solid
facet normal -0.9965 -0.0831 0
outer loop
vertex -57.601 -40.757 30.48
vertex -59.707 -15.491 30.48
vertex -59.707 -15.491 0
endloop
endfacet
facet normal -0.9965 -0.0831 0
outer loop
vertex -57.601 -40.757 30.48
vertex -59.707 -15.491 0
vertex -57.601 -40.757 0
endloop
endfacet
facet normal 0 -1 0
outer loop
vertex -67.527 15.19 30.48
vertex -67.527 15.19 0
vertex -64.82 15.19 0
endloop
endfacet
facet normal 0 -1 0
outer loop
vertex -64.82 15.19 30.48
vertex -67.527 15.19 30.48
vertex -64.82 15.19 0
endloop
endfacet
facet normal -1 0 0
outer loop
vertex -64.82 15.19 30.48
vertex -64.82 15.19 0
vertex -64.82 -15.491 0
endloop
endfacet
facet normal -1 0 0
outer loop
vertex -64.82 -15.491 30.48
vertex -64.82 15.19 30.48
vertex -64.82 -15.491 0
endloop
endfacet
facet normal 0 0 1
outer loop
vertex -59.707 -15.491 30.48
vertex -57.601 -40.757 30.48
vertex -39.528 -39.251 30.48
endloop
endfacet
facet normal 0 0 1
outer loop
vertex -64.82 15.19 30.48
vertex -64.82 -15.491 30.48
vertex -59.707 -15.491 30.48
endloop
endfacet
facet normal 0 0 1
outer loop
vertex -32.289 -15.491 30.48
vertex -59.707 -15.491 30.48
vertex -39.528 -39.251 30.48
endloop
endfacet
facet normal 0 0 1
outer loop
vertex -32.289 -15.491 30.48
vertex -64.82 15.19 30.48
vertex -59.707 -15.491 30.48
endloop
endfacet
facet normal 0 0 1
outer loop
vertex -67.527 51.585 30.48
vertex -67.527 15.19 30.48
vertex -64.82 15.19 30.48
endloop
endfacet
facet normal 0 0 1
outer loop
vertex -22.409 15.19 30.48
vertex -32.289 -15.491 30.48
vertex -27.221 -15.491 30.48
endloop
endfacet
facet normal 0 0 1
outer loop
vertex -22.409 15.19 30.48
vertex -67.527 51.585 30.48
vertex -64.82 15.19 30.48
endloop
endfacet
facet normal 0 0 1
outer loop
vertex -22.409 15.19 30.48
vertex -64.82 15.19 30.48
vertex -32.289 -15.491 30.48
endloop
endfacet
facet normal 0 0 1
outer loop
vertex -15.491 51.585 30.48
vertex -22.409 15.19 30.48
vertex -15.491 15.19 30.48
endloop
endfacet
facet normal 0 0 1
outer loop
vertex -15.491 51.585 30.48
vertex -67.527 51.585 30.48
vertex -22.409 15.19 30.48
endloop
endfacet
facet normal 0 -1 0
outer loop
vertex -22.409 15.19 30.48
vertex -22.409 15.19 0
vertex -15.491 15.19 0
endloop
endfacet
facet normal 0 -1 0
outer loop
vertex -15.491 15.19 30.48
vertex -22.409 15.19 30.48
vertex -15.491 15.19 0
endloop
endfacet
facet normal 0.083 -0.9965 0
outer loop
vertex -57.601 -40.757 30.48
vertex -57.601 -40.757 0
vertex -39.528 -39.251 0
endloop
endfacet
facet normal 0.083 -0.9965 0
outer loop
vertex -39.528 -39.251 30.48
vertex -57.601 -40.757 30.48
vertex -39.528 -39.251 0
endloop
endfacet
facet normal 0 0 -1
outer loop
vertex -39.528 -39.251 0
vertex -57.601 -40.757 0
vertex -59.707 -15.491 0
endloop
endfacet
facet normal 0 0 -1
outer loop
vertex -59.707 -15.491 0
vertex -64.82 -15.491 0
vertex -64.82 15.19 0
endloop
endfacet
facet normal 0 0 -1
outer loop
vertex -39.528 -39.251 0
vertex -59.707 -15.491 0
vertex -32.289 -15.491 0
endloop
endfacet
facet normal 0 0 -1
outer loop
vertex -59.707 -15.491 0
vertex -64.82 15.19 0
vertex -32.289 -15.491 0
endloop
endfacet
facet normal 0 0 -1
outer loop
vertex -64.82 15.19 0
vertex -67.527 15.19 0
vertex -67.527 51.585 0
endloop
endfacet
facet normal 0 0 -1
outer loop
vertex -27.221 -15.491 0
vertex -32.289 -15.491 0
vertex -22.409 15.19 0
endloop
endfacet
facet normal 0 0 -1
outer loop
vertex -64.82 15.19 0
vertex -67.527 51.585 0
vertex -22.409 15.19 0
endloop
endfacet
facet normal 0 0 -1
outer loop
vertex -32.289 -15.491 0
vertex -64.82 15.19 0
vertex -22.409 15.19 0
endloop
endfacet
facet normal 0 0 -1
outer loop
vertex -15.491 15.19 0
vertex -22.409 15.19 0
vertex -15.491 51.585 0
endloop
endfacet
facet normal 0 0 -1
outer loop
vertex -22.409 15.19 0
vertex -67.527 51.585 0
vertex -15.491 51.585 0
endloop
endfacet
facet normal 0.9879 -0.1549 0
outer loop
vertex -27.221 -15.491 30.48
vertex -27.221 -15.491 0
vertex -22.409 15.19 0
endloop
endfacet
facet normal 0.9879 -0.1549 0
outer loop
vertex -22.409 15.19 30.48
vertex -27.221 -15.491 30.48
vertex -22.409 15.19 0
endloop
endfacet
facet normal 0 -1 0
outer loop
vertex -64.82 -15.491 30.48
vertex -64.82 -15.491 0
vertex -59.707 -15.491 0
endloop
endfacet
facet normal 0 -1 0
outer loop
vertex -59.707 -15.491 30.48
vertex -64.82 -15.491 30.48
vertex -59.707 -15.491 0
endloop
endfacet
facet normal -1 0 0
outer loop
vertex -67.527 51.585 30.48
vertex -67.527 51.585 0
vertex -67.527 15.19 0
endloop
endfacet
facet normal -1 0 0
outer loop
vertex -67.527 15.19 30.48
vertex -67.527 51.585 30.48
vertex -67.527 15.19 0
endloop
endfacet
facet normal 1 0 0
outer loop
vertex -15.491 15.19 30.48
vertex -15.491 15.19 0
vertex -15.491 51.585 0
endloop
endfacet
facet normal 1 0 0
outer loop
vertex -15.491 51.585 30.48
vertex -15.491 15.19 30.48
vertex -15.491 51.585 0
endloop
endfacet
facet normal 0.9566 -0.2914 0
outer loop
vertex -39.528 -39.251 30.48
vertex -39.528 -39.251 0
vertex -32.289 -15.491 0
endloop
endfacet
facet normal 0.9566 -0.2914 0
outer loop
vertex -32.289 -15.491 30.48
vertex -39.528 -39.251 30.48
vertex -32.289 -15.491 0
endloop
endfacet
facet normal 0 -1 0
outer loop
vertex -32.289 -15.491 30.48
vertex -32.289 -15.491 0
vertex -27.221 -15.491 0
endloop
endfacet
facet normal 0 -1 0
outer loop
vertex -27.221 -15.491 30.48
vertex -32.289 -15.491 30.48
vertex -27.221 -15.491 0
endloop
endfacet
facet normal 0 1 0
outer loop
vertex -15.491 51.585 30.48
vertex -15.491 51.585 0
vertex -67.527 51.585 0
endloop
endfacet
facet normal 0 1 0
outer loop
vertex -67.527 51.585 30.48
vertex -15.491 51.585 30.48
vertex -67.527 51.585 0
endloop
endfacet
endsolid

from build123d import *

# Parameters (mm, degrees)
F1_DEPTH = 30.48


with BuildPart() as f1:
    # F0 (on Top) → F1 (new body)
    with BuildSketch(Plane.XY):
        Polygon((-32.288667, -15.490659), (-59.70671, -15.490659), (-57.601184, -40.756974), (-39.528311, -39.250901), align=None)
        Polygon((-22.408817, 15.189869), (-64.820133, 15.189869), (-64.820133, -15.490659), (-59.70671, -15.490659), (-32.288667, -15.490659), (-27.221447, -15.490659), align=None)
        Polygon((-67.527235, 51.585395), (-67.527235, 15.189869), (-64.820133, 15.189869), (-22.408817, 15.189869), (-15.490659, 15.189869), (-15.490659, 51.585395), align=None)
    extrude(amount=F1_DEPTH)


solid = f1.part
